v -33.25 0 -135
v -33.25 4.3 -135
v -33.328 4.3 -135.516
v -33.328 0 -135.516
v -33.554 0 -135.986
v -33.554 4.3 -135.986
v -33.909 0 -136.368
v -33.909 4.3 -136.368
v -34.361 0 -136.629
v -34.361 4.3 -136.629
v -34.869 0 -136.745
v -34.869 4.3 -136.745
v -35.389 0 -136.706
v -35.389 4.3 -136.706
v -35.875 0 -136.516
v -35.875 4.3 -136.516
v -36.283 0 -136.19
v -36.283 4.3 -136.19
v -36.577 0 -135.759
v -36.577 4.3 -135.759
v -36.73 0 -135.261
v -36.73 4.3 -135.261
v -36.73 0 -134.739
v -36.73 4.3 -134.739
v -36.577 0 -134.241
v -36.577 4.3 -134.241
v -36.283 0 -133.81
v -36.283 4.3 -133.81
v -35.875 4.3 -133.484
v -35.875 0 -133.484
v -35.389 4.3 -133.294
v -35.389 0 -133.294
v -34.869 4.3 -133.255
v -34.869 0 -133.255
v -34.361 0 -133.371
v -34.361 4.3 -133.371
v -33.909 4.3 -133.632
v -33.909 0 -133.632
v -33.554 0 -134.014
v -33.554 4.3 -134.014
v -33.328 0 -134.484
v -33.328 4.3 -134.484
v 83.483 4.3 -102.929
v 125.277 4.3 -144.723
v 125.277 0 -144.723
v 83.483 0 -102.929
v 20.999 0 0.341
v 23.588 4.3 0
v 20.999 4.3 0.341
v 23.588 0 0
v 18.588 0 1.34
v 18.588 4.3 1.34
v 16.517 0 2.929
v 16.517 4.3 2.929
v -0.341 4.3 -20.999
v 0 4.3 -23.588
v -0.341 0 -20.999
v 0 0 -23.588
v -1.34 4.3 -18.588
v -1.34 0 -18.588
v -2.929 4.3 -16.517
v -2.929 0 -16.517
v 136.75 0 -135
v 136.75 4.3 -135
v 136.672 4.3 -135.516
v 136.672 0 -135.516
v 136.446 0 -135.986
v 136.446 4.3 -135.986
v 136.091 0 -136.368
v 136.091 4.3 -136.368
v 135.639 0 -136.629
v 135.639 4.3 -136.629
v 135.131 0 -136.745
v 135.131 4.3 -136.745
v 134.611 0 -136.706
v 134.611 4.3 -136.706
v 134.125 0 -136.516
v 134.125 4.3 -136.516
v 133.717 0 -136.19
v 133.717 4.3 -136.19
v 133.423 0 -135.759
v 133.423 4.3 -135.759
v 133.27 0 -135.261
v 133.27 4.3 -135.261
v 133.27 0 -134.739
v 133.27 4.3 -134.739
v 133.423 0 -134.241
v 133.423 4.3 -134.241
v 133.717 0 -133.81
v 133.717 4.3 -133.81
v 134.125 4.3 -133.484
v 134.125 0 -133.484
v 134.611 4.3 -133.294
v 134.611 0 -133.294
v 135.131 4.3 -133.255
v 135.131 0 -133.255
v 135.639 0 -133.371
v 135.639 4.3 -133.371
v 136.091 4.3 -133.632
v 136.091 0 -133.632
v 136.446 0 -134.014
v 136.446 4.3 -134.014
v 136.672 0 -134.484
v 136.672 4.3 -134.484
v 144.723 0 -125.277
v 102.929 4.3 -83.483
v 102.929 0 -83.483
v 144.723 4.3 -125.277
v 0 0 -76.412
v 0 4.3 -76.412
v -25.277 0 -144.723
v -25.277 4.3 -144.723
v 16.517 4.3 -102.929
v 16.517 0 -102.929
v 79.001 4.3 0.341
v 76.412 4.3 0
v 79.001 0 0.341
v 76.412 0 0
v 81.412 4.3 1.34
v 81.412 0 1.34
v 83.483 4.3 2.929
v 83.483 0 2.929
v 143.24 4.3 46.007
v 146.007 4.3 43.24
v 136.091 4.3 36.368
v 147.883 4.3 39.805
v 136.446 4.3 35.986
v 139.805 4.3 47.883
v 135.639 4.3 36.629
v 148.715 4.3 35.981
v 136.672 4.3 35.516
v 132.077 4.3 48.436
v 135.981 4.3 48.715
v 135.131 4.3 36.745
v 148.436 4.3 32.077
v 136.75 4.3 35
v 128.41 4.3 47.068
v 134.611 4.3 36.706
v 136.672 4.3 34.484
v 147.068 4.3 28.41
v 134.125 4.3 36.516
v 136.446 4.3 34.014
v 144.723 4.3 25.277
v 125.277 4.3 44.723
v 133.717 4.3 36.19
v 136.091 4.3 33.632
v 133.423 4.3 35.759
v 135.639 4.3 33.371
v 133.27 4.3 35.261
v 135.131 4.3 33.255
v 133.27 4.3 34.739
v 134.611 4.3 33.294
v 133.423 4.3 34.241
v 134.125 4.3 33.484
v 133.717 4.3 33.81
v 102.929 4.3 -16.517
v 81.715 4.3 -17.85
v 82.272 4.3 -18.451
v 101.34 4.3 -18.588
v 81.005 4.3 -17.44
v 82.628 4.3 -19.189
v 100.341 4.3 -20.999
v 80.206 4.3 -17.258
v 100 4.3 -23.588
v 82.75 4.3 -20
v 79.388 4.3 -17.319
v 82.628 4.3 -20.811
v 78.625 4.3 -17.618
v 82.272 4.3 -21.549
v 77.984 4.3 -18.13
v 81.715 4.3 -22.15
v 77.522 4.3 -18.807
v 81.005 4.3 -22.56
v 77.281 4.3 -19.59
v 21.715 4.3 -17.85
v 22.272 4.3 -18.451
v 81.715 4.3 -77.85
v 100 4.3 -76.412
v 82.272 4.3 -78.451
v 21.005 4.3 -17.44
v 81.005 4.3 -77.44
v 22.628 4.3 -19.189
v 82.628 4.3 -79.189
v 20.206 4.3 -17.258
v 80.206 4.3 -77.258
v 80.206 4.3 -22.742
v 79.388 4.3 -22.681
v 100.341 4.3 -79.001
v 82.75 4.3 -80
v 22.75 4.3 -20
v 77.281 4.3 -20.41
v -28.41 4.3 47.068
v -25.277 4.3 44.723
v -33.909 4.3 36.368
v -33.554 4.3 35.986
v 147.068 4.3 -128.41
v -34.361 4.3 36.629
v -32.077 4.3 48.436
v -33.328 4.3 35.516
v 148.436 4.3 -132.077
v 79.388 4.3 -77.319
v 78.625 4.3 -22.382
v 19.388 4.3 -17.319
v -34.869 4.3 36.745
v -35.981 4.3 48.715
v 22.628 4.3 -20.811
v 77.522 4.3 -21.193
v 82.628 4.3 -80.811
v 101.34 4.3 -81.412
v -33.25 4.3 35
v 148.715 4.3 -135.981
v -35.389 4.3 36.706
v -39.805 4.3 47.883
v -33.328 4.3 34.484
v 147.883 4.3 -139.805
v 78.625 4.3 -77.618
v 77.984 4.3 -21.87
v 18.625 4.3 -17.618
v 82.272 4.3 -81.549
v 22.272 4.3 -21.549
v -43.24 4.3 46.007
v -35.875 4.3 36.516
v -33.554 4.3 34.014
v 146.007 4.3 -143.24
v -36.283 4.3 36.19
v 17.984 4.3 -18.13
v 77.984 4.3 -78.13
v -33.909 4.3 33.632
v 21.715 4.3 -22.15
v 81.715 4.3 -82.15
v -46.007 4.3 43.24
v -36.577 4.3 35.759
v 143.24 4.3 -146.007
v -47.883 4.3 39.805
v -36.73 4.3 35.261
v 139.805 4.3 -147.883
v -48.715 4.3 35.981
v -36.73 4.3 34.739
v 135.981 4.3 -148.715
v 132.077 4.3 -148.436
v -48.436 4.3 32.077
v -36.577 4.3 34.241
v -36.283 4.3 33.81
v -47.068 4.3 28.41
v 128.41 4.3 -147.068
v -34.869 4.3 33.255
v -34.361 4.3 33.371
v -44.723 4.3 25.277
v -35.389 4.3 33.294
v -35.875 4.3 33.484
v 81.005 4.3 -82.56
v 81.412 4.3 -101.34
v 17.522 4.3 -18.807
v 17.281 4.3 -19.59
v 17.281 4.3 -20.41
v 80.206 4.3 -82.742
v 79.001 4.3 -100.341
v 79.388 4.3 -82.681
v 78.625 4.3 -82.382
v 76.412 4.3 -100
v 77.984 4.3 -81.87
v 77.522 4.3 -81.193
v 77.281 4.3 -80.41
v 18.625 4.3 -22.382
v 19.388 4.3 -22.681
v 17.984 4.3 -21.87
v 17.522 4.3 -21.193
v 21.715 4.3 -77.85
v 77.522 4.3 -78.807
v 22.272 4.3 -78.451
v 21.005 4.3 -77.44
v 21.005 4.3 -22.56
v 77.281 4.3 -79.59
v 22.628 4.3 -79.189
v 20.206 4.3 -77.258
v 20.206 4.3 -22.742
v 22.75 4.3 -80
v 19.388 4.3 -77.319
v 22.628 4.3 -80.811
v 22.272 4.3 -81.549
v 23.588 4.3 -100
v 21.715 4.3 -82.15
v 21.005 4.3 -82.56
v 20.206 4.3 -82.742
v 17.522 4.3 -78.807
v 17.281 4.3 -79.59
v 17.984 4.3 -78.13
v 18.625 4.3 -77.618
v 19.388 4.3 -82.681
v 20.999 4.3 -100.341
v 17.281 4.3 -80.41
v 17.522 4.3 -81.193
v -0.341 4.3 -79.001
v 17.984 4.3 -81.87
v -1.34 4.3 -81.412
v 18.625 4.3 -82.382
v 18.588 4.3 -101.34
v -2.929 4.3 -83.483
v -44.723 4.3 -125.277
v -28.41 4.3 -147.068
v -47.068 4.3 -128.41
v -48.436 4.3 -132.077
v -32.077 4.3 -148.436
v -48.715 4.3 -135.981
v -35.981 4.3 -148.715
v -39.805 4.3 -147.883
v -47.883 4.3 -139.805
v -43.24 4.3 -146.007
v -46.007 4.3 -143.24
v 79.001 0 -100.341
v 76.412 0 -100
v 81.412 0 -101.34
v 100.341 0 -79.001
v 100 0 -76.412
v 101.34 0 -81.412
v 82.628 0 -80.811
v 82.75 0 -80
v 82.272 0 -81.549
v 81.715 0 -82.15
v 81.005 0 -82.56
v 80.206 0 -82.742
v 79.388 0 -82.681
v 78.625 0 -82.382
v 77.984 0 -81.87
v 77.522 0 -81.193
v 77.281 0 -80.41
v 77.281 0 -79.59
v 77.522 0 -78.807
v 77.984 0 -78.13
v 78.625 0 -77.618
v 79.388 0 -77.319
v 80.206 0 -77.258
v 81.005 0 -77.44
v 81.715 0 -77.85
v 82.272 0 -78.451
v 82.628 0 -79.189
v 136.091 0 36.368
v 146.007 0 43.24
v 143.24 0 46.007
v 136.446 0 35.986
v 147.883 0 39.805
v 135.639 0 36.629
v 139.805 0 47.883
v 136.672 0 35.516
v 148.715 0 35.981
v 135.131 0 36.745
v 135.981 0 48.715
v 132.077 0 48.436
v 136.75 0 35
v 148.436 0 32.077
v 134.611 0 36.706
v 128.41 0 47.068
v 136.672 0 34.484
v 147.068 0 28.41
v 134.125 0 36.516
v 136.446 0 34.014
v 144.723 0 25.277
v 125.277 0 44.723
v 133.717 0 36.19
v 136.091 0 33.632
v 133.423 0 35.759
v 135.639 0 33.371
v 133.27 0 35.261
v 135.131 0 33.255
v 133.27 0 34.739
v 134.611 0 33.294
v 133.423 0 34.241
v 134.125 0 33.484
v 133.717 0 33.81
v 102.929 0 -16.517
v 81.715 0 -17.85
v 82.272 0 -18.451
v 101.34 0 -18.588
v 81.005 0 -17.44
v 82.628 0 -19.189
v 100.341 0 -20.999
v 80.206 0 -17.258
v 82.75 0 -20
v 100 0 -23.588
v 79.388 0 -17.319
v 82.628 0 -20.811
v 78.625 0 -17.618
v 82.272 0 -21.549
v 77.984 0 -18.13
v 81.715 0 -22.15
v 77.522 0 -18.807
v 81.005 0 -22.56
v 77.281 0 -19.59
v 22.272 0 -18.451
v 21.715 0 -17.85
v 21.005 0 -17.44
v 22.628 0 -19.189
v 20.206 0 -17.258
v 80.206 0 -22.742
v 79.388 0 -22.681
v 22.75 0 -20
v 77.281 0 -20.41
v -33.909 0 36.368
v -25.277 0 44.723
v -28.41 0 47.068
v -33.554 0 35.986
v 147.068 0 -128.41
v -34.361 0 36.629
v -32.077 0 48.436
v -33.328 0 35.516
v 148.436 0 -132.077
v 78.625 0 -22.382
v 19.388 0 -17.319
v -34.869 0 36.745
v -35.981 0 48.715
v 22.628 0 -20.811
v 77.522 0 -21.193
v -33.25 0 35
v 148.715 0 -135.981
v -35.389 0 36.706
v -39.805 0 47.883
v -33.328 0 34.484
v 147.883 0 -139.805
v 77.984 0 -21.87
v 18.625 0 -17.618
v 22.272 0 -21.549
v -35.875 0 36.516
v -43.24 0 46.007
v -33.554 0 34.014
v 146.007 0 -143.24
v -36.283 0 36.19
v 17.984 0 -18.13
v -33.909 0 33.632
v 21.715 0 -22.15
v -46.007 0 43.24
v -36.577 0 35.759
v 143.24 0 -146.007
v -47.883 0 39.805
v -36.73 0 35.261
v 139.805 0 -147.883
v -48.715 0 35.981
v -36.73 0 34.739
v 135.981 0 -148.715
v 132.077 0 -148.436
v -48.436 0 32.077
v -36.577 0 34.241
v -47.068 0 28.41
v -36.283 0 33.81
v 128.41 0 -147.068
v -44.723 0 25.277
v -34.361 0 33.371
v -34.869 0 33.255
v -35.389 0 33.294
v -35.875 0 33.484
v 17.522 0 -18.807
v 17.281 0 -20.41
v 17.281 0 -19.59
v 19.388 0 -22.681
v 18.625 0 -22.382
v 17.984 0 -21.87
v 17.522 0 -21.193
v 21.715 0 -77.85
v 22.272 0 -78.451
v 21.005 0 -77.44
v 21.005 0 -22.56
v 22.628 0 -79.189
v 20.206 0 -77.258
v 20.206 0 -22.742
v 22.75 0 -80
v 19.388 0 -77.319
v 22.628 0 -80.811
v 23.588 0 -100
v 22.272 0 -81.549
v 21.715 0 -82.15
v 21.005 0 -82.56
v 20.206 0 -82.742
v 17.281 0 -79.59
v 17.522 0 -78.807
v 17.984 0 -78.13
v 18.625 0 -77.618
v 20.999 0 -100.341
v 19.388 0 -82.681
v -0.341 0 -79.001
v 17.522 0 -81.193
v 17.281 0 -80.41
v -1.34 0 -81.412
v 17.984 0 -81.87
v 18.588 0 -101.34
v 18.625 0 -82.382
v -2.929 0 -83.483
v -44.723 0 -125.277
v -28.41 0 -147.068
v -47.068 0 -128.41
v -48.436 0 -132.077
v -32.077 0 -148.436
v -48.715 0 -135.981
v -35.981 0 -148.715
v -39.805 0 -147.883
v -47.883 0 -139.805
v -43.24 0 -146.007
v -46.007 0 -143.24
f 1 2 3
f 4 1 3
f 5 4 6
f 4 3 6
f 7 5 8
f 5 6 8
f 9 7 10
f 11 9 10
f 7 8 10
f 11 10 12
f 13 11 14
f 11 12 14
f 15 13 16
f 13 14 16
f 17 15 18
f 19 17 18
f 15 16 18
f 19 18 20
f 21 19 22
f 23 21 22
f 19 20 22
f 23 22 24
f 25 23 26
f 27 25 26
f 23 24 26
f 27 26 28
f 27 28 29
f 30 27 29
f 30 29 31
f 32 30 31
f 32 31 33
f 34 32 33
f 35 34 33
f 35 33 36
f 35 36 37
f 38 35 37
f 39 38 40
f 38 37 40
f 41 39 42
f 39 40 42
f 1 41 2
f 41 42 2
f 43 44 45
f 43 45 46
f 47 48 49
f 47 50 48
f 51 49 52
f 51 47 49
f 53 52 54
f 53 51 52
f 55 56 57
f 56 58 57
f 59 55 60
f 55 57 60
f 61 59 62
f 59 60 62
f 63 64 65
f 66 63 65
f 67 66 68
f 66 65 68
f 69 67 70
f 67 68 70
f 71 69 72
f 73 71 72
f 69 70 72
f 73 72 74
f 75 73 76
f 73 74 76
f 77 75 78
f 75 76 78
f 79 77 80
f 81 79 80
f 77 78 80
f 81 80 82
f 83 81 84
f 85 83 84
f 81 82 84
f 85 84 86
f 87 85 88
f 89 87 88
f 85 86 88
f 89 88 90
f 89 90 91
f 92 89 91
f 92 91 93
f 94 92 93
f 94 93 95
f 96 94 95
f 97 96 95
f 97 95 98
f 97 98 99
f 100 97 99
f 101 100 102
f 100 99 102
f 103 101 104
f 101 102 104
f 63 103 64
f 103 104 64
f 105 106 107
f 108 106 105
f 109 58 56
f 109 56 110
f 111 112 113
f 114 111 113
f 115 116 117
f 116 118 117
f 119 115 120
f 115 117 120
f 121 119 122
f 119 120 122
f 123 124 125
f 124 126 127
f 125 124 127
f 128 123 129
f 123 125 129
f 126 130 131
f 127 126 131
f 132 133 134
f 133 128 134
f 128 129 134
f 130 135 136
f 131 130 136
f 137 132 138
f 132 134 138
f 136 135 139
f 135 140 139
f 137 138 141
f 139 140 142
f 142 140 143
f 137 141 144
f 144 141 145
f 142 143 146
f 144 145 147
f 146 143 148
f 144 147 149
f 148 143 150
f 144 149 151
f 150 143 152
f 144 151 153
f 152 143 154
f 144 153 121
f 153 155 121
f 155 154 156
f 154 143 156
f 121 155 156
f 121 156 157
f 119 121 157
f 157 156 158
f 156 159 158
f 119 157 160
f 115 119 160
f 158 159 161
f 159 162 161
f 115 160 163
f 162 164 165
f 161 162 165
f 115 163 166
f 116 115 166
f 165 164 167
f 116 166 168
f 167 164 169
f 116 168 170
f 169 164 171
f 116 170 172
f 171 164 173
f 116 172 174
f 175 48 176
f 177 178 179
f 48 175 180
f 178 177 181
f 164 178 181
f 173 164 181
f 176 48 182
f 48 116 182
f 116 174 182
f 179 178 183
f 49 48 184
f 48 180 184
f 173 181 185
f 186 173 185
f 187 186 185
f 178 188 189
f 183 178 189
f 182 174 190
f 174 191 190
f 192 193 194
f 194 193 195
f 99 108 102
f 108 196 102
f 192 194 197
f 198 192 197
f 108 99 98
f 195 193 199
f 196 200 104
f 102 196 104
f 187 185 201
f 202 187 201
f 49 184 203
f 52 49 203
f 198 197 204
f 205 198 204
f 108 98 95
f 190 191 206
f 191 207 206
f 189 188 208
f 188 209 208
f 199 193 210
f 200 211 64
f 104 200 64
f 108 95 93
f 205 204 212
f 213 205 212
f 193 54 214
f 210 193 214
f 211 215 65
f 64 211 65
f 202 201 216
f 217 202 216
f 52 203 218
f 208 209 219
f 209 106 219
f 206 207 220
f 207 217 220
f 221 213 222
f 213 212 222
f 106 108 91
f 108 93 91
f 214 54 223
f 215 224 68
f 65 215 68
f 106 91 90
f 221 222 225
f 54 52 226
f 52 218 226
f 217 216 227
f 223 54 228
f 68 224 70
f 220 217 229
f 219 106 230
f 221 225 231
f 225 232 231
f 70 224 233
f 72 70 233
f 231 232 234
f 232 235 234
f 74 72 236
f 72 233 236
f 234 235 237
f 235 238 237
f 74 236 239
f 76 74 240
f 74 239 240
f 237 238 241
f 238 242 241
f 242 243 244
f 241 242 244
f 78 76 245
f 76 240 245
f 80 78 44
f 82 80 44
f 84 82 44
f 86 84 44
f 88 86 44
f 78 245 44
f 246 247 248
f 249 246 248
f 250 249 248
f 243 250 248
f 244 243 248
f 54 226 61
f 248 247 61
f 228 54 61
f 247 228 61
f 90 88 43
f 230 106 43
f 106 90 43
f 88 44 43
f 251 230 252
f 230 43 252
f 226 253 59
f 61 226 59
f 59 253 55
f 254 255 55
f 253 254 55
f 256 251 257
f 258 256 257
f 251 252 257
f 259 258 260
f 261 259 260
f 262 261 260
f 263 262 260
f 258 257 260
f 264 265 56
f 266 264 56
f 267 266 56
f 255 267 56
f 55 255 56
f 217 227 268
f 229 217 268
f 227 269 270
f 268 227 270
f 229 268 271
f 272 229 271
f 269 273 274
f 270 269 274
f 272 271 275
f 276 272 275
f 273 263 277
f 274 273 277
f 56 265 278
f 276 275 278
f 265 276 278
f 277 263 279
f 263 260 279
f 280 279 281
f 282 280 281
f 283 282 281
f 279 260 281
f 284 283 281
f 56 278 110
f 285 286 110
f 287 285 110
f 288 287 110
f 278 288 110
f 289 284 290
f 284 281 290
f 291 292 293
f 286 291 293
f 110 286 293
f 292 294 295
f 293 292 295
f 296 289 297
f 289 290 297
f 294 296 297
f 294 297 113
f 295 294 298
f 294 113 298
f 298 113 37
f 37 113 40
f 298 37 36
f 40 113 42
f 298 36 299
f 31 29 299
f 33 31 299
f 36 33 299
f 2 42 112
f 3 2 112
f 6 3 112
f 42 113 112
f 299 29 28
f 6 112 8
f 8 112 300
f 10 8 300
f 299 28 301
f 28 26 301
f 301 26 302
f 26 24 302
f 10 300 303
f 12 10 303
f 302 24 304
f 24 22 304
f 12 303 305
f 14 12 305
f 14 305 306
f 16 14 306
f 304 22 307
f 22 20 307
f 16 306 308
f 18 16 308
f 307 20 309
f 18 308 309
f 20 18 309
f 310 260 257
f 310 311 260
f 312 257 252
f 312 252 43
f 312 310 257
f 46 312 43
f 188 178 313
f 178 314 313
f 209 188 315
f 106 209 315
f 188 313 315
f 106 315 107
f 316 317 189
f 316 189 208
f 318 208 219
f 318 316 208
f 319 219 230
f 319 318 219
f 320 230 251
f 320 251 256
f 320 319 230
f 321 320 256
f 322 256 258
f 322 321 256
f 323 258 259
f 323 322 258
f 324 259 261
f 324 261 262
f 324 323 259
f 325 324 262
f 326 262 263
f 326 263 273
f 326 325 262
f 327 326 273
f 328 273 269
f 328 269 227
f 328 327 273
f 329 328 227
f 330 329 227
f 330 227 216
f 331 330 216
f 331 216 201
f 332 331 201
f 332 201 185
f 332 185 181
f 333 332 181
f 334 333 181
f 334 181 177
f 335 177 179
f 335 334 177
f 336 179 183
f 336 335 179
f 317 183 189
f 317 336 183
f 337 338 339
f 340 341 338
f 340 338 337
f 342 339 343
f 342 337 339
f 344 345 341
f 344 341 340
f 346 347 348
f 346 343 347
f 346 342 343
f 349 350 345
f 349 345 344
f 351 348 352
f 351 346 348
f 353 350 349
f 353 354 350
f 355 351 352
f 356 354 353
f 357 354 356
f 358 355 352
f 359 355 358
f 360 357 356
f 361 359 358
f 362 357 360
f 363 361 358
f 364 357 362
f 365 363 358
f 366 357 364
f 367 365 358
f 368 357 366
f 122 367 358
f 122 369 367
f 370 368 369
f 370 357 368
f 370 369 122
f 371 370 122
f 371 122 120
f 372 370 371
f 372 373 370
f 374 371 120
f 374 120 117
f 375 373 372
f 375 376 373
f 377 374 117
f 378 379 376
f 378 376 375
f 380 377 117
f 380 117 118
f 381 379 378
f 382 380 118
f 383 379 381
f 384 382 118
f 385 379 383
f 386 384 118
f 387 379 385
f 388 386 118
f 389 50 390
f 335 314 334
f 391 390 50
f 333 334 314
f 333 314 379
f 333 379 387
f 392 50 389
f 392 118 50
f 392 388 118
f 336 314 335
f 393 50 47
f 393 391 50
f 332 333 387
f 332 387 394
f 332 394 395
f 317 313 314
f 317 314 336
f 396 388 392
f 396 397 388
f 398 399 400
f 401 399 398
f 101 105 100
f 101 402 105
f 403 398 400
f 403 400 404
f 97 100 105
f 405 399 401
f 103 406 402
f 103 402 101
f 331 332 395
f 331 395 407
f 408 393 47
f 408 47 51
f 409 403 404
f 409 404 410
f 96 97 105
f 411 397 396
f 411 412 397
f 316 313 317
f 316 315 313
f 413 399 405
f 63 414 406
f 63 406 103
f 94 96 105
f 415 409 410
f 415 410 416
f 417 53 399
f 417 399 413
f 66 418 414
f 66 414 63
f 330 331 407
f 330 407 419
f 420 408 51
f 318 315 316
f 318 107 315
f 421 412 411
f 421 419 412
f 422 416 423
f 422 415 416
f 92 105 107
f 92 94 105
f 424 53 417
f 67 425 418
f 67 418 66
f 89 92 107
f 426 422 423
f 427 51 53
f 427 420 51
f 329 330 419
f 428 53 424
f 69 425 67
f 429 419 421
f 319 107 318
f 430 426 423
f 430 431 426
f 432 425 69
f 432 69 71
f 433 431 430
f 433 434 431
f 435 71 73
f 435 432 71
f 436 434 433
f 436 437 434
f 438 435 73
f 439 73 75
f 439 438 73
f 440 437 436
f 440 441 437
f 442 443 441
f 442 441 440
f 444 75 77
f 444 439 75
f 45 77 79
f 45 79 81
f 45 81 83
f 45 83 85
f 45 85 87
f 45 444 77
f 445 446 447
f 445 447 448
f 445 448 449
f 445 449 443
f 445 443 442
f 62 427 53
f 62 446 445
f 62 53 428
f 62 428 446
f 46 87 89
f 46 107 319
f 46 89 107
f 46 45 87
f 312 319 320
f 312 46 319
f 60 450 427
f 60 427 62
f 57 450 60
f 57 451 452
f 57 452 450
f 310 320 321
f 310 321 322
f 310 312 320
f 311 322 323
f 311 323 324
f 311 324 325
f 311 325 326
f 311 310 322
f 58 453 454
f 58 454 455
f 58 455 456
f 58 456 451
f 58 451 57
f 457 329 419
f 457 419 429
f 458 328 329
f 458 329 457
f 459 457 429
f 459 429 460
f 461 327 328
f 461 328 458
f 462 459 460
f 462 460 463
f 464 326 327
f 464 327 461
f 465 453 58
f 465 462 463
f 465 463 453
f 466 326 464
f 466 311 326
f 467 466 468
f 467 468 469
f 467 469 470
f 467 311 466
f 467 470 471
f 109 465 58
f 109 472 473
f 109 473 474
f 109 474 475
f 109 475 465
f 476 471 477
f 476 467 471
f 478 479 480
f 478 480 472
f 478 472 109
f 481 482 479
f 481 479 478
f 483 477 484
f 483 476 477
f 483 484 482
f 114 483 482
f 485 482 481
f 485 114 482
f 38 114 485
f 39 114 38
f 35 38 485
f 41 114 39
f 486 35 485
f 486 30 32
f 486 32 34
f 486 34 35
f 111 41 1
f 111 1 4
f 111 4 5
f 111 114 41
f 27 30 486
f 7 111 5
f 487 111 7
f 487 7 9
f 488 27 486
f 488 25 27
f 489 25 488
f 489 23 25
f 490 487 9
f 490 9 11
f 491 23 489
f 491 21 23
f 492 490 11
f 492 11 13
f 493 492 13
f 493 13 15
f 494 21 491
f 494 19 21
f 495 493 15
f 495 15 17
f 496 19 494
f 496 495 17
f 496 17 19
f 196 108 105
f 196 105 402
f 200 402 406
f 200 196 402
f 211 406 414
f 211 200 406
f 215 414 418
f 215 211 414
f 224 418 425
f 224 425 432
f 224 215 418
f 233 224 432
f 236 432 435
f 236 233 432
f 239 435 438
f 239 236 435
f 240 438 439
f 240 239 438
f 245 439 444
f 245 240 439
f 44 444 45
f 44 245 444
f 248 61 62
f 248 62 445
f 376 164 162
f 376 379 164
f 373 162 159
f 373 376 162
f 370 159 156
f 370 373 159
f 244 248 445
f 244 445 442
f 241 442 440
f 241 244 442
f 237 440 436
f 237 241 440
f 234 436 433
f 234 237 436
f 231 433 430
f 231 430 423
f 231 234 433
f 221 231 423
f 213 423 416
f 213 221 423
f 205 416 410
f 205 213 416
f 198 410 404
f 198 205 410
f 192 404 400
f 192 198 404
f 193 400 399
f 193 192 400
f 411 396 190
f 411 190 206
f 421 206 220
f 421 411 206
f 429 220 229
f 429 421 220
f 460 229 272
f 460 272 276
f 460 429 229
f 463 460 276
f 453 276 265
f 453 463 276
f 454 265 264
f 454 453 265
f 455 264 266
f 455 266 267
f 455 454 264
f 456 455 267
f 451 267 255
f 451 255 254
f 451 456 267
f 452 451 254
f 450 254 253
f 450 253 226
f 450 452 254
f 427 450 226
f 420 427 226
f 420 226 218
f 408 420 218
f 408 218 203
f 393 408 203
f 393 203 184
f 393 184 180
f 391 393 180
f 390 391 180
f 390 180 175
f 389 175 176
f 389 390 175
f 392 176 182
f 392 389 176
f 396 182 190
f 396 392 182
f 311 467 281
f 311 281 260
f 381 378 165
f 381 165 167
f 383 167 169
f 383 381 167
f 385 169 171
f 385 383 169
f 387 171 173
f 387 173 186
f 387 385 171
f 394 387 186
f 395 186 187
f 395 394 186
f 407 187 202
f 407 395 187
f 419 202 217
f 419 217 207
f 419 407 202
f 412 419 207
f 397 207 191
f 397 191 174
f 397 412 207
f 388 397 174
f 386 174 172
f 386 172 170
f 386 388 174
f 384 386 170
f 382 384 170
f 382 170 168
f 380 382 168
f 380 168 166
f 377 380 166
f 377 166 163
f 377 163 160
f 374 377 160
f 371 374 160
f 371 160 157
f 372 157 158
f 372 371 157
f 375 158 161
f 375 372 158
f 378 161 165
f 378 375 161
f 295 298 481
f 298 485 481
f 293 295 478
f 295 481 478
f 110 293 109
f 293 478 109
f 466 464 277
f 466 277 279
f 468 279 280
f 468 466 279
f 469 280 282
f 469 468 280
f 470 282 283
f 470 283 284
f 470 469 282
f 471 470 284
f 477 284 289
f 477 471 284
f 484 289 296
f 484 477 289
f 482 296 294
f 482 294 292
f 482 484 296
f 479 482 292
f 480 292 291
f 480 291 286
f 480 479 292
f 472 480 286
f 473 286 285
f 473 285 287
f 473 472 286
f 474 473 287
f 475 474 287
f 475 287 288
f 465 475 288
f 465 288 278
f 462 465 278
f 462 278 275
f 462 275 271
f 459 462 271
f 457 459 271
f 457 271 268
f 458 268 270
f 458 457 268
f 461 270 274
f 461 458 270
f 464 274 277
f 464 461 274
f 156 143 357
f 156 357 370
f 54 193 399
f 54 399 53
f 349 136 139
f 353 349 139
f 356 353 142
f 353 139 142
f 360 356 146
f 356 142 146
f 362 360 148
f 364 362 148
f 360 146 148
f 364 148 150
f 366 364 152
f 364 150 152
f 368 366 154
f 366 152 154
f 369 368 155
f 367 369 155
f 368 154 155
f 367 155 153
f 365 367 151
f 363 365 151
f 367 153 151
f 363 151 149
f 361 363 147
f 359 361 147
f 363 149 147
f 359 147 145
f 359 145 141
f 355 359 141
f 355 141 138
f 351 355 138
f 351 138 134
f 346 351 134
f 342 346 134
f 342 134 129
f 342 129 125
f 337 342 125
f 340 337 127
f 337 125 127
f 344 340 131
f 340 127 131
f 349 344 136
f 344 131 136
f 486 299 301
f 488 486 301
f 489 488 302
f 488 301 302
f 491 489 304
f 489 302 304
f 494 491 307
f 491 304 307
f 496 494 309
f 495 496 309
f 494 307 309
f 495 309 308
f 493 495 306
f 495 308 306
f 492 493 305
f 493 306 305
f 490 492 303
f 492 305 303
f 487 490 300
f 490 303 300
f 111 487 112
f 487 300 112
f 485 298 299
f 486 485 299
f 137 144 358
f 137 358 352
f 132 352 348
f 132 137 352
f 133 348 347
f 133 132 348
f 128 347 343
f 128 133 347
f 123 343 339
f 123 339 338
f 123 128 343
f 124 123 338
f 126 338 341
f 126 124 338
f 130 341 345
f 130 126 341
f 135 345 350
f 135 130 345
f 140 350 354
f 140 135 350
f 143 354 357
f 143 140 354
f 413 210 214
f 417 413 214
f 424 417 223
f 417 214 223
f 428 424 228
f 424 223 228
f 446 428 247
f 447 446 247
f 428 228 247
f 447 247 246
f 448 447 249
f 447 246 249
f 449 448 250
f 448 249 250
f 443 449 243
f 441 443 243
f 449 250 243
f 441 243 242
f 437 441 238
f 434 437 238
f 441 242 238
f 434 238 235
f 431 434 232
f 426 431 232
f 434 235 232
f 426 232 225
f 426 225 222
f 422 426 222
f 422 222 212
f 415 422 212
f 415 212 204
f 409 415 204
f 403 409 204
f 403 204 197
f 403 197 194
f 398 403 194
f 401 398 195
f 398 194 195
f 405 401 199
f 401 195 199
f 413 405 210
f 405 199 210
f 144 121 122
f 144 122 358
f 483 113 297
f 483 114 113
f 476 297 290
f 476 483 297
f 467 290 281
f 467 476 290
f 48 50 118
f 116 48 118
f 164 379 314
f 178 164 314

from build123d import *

# Parameters (mm, degrees)
SKETCH1_W           = 100
SKETCH1_H           = 100
SKETCH1_R           = 2.75
BOSS_EXTRUDE1_DEPTH = 4.3
SKETCH2_R           = 1.75
BOSS_EXTRUDE2_DEPTH = 4.3
FILLET1_R           = 10


with BuildPart() as part:
    # Sketch1 → Boss-Extrude1 (new body)
    with BuildSketch(Plane(origin=(0, 0, 0), x_dir=(1, 0, 0), z_dir=(0, 1, 0))):
        with Locations((50, 50)):
            Rectangle(SKETCH1_W, SKETCH1_H)
        with Locations((20, 80)):
            Circle(SKETCH1_R, mode=Mode.SUBTRACT)
        with Locations((80, 80)):
            Circle(SKETCH1_R, mode=Mode.SUBTRACT)
        with Locations((80, 20)):
            Circle(SKETCH1_R, mode=Mode.SUBTRACT)
        with Locations((20, 20)):
            Circle(SKETCH1_R, mode=Mode.SUBTRACT)
    extrude(amount=BOSS_EXTRUDE1_DEPTH)

    # Sketch2 → Boss-Extrude2 (add)
    with BuildSketch(Plane(origin=(0, 4.3, 0), x_dir=(1, 0, 0), z_dir=(0, 1, 0))):
        with BuildLine():
            Line((0, 80.554563517), (-44.722718241, 125.277281759))
            ThreePointArc((-44.722718241, 125.277281759), (-44.722718241, 144.722718241), (-25.277281759, 144.722718241))
            Line((-25.277281759, 144.722718241), (19.445436483, 100))
            Line((19.445436483, 100), (0, 100))
            Line((0, 100), (0, 80.554563517))
        make_face()
        with Locations((-35, 135)):
            Circle(SKETCH2_R, mode=Mode.SUBTRACT)
        with BuildLine():
            Line((100, 100), (100, 80.554563517))
            Line((100, 80.554563517), (144.722718241, 125.277281759))
            ThreePointArc((144.722718241, 125.277281759), (144.722718241, 144.722718241), (125.277281759, 144.722718241))
            Line((125.277281759, 144.722718241), (80.554563517, 100))
            Line((80.554563517, 100), (100, 100))
        make_face()
        with Locations((135, 135)):
            Circle(SKETCH2_R, mode=Mode.SUBTRACT)
        with BuildLine():
            Line((100, 0), (80.554563517, 0))
            Line((80.554563517, 0), (125.277281759, -44.722718241))
            ThreePointArc((125.277281759, -44.722718241), (144.722718241, -44.722718241), (144.722718241, -25.277281759))
            Line((144.722718241, -25.277281759), (100, 19.445436483))
            Line((100, 19.445436483), (100, 0))
        make_face()
        with Locations((135, -35)):
            Circle(SKETCH2_R, mode=Mode.SUBTRACT)
        with BuildLine():
            Line((0, 0), (0, 19.445436483))
            Line((0, 19.445436483), (-44.722718241, -25.277281759))
            ThreePointArc((-44.722718241, -25.277281759), (-44.722718241, -44.722718241), (-25.277281759, -44.722718241))
            Line((-25.277281759, -44.722718241), (19.445436483, 0))
            Line((19.445436483, 0), (0, 0))
        make_face()
        with Locations((-35, -35)):
            Circle(SKETCH2_R, mode=Mode.SUBTRACT)
    extrude(amount=-BOSS_EXTRUDE2_DEPTH)

    # Fillet1
    fillet1_edges = [part.edges().sort_by_distance(p)[0] for p in [
        (0, 2.15, -80.554563517),
        (19.445436483, 2.15, -100),
        (80.554563517, 2.15, -100),
        (100, 2.15, -80.554563517),
        (100, 2.15, -19.445436483),
        (80.554563517, 2.15, 0),
        (19.445436483, 2.15, 0),
        (0, 2.15, -19.445436483),
    ]]
    fillet(fillet1_edges, radius=FILLET1_R)


solid = part.part
